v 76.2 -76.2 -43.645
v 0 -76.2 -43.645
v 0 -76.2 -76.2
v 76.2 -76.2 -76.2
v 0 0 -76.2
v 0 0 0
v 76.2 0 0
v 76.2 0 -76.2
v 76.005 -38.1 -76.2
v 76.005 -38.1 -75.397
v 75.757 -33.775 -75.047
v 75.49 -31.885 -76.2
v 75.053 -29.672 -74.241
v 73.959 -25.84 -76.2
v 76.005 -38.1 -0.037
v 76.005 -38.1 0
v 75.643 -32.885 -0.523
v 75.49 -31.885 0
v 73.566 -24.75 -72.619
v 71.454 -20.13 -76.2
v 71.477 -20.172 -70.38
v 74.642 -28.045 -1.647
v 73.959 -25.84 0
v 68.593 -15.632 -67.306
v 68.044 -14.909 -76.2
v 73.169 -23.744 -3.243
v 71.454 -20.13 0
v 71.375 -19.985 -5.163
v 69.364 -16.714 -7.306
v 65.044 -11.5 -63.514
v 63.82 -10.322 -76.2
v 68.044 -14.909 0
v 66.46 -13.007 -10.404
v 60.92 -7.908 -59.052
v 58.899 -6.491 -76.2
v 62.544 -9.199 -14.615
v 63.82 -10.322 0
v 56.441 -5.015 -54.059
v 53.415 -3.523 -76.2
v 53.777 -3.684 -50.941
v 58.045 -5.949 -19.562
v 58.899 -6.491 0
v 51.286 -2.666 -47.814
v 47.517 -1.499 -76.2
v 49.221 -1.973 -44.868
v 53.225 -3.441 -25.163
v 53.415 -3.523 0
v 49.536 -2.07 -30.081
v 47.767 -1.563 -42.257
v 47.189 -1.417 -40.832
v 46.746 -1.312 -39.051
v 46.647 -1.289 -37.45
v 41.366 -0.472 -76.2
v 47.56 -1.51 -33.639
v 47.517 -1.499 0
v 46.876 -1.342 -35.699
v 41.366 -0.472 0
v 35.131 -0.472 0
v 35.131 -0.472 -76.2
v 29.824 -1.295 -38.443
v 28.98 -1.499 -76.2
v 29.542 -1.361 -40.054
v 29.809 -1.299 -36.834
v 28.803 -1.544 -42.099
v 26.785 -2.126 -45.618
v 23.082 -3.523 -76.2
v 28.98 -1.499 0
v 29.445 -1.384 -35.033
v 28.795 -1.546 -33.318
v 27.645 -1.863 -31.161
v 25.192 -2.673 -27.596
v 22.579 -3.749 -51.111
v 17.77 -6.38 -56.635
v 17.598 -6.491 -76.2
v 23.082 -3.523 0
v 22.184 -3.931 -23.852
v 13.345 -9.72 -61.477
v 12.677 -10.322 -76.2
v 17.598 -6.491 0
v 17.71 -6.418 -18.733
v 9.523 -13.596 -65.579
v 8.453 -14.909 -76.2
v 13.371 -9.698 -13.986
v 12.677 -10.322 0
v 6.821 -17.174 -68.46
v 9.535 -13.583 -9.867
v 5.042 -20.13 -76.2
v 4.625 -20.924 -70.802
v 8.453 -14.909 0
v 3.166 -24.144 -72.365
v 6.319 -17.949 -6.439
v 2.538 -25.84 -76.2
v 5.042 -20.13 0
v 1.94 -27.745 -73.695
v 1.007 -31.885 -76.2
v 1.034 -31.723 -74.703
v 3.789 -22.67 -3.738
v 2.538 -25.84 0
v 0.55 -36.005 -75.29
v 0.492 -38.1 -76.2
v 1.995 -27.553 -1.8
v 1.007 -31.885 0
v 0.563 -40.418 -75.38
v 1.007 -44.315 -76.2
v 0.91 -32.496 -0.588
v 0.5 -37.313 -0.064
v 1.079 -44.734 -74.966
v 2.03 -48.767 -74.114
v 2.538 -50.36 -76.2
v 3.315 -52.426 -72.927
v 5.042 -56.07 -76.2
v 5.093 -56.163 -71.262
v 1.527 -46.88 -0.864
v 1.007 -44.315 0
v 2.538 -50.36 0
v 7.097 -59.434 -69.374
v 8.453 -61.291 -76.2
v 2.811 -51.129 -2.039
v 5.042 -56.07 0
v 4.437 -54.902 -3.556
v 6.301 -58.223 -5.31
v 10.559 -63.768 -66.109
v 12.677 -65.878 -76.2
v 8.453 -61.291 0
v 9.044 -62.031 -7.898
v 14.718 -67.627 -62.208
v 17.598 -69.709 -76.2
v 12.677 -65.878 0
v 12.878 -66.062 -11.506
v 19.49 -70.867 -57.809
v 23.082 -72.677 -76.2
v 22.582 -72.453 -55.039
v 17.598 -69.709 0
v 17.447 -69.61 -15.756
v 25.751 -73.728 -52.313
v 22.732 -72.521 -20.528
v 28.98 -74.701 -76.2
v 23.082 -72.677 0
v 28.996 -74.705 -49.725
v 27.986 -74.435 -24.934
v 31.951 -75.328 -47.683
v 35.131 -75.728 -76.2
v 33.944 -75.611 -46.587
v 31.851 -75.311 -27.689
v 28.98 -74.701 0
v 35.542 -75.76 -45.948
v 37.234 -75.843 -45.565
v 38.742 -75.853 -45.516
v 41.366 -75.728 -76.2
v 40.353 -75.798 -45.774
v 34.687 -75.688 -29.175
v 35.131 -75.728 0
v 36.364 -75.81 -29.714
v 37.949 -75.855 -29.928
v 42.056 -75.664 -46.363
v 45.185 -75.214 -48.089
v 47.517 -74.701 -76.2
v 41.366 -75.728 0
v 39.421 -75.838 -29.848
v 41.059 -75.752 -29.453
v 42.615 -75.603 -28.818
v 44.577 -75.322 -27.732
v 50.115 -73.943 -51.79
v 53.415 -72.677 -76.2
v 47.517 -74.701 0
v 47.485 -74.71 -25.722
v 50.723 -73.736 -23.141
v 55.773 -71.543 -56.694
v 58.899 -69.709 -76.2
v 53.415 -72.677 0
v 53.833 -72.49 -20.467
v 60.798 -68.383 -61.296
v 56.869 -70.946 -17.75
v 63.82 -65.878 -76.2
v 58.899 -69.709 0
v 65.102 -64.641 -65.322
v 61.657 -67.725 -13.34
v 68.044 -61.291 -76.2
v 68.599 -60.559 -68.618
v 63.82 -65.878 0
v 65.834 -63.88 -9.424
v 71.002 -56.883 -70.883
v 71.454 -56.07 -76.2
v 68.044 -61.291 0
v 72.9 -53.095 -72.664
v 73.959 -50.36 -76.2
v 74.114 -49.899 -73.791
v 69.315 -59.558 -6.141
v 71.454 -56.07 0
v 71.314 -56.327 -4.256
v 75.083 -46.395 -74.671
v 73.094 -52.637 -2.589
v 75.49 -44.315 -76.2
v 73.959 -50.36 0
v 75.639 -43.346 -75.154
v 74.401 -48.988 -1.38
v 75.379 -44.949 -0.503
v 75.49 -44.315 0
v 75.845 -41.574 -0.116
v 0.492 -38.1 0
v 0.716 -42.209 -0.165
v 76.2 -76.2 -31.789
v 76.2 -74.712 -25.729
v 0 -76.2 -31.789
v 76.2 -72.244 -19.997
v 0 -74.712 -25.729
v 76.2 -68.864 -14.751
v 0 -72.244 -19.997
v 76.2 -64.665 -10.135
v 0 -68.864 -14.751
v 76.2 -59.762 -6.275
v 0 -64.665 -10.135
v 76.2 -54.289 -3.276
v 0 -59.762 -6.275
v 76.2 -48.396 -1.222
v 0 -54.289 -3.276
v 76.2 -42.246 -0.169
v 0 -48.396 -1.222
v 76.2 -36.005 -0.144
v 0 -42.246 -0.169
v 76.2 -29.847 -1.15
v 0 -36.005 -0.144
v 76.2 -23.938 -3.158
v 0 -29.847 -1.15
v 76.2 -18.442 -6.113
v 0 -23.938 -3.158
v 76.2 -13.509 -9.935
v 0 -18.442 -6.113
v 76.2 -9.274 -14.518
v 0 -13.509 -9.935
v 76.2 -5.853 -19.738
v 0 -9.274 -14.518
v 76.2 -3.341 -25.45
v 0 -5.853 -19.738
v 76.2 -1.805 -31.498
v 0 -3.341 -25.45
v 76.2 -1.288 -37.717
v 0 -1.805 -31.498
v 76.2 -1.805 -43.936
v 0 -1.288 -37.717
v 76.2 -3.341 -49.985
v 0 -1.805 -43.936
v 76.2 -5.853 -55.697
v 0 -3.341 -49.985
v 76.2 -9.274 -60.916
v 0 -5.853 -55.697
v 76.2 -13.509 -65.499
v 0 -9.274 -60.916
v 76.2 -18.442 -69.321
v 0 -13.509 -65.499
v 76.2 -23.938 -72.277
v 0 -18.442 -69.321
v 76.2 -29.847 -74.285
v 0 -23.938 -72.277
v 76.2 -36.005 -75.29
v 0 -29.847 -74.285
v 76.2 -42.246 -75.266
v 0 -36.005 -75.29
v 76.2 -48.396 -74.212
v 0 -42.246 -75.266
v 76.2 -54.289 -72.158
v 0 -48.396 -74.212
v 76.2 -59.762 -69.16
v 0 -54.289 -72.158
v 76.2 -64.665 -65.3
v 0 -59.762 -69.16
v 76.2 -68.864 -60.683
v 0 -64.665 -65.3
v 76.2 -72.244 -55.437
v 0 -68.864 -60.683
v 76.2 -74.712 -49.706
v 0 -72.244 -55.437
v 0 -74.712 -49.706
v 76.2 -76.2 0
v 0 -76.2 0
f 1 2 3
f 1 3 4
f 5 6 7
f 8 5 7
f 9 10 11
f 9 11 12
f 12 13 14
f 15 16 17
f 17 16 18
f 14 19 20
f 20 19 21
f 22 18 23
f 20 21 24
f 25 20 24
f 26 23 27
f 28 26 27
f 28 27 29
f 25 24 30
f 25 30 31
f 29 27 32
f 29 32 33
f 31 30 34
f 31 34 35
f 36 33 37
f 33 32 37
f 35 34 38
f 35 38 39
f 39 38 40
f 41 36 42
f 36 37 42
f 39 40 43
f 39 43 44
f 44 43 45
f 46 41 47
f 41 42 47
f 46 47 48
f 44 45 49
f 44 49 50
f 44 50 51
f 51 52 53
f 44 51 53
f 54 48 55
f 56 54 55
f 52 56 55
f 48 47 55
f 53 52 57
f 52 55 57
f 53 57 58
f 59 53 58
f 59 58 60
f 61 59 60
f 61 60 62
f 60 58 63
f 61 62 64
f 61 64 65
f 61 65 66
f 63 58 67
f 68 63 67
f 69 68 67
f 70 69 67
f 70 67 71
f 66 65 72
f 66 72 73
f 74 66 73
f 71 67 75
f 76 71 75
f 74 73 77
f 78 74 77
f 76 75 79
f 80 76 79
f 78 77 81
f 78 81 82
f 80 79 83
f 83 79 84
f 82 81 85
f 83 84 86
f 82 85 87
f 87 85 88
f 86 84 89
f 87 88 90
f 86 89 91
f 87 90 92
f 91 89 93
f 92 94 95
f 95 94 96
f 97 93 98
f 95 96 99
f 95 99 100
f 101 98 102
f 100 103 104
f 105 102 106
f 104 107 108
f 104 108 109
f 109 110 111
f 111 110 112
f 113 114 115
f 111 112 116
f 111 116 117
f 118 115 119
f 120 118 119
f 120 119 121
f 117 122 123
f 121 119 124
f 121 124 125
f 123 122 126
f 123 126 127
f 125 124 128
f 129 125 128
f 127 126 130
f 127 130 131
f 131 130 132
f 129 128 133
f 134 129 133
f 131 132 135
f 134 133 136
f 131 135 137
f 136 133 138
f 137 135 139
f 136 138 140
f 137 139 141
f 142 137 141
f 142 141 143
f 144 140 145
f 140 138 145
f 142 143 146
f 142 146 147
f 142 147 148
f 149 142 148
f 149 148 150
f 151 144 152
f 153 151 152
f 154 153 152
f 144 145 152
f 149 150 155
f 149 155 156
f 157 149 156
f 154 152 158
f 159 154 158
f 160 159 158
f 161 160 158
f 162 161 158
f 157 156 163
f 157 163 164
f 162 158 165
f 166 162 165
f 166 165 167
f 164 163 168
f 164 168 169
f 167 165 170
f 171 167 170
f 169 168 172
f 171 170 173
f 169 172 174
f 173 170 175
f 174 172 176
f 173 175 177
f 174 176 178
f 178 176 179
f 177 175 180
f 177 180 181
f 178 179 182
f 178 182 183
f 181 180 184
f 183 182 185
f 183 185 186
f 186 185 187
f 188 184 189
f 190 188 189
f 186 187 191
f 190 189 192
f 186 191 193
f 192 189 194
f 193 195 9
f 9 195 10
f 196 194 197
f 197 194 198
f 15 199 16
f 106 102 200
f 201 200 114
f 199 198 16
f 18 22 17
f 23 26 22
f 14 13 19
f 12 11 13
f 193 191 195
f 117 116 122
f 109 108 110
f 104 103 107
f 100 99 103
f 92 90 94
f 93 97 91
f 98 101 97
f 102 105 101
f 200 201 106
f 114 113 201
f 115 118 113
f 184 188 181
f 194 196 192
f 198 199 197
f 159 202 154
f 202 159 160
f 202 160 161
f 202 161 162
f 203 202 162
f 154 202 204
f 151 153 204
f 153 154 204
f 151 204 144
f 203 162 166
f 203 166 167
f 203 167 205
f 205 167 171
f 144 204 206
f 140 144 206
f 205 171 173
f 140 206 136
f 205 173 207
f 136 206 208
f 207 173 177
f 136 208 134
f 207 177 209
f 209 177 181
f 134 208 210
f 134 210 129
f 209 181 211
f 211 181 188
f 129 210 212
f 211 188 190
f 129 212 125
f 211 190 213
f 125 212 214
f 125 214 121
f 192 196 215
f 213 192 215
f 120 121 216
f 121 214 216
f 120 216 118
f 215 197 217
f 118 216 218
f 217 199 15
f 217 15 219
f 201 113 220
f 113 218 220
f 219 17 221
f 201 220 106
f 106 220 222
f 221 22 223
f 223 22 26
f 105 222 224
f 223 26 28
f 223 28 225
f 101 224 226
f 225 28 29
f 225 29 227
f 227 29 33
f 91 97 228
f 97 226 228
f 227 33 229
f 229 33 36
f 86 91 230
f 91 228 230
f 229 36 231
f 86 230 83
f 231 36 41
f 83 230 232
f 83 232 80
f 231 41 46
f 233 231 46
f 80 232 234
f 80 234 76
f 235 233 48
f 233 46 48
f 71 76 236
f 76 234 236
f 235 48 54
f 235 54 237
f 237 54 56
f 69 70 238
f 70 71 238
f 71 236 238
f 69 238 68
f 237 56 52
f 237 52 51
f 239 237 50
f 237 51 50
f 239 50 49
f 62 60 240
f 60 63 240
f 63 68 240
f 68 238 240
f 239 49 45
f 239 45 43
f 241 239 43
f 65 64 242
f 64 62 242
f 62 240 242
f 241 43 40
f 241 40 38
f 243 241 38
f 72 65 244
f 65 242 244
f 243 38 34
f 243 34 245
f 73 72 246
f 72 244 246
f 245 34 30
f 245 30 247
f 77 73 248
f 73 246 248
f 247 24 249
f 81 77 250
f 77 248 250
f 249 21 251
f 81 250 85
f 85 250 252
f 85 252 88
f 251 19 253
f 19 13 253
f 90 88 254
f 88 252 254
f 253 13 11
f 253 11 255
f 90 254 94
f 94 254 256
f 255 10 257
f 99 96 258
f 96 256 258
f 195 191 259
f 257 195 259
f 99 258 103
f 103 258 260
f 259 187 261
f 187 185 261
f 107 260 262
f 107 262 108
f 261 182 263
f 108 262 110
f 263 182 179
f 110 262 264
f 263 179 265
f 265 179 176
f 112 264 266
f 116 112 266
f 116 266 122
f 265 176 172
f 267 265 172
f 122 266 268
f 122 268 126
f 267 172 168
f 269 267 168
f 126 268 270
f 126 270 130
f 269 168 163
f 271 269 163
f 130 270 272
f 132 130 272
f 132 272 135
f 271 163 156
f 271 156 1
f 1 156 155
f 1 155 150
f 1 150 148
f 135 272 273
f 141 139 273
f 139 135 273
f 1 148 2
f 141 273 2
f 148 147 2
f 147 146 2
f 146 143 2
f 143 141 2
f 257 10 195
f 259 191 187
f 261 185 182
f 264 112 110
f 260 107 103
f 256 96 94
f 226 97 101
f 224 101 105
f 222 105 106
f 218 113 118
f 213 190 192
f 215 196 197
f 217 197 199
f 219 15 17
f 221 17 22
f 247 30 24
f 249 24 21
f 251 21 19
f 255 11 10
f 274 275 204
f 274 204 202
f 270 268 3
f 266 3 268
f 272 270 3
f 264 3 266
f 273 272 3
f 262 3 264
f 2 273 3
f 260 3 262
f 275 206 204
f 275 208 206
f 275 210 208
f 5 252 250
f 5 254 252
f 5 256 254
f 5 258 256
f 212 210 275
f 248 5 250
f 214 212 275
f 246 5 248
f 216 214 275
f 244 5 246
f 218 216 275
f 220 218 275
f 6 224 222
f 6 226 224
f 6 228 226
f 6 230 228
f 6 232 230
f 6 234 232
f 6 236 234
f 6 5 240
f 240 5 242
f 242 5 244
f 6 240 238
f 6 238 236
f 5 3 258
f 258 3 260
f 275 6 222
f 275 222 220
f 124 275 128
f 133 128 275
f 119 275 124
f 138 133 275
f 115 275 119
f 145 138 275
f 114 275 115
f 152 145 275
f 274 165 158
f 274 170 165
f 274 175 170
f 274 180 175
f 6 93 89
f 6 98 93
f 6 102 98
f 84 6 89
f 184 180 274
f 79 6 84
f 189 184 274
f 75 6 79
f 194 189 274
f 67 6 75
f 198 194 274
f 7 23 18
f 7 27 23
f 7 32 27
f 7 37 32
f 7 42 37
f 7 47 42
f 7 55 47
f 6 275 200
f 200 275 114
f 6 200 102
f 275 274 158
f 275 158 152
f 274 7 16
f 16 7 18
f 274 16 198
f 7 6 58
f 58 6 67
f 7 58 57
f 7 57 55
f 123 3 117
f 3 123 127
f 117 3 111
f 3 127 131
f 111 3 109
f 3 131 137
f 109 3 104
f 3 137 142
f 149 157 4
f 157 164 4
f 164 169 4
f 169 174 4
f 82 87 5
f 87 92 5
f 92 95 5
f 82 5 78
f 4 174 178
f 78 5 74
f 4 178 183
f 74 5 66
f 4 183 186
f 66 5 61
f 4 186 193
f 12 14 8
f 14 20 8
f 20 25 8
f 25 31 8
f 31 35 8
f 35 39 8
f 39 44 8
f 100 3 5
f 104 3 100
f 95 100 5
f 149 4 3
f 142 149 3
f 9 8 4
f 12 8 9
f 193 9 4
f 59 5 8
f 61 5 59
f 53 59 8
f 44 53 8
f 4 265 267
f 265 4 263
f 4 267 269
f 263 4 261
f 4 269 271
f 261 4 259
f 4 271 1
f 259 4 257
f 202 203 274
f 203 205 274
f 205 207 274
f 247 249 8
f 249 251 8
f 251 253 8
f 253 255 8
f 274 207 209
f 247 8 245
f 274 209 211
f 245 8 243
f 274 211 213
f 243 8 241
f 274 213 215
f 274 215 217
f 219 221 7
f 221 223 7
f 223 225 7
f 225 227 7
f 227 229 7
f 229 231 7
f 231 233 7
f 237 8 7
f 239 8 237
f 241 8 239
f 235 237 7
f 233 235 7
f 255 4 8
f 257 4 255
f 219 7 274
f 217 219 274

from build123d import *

# Parameters (mm, degrees)
F0_W     = 76.2
F0_H     = 76.2
F1_DEPTH = 76.2
F2_R     = 37.756667
F3_DEPTH = 76.2
F5_DEPTH = 78.74


with BuildPart() as f1:
    # F0 (on Front) → F1 (new body)
    with BuildSketch(Plane.XZ):
        with Locations((38.1, -38.1)):
            Rectangle(F0_W, F0_H)
    extrude(amount=F1_DEPTH)

    # F2 (on face) → F3 (cut)
    with BuildSketch(Plane.XY):
        with Locations((38.248464, -38.1)):
            Circle(F2_R)
    extrude(amount=-F3_DEPTH, mode=Mode.SUBTRACT)

    # F4 (on face) → F5 (cut)
    with BuildSketch(Plane(origin=(0, 0, 0), x_dir=(0, -1, 0), z_dir=(-1, 0, 0))):
        with BuildLine():
            Line((76.2, -43.645483), (76.2, -31.788889))
            ThreePointArc((76.2, -31.788889), (1.288281, -37.717186), (76.2, -43.645483))
        make_face()
    extrude(amount=-F5_DEPTH, mode=Mode.SUBTRACT)


solid = f1.part
